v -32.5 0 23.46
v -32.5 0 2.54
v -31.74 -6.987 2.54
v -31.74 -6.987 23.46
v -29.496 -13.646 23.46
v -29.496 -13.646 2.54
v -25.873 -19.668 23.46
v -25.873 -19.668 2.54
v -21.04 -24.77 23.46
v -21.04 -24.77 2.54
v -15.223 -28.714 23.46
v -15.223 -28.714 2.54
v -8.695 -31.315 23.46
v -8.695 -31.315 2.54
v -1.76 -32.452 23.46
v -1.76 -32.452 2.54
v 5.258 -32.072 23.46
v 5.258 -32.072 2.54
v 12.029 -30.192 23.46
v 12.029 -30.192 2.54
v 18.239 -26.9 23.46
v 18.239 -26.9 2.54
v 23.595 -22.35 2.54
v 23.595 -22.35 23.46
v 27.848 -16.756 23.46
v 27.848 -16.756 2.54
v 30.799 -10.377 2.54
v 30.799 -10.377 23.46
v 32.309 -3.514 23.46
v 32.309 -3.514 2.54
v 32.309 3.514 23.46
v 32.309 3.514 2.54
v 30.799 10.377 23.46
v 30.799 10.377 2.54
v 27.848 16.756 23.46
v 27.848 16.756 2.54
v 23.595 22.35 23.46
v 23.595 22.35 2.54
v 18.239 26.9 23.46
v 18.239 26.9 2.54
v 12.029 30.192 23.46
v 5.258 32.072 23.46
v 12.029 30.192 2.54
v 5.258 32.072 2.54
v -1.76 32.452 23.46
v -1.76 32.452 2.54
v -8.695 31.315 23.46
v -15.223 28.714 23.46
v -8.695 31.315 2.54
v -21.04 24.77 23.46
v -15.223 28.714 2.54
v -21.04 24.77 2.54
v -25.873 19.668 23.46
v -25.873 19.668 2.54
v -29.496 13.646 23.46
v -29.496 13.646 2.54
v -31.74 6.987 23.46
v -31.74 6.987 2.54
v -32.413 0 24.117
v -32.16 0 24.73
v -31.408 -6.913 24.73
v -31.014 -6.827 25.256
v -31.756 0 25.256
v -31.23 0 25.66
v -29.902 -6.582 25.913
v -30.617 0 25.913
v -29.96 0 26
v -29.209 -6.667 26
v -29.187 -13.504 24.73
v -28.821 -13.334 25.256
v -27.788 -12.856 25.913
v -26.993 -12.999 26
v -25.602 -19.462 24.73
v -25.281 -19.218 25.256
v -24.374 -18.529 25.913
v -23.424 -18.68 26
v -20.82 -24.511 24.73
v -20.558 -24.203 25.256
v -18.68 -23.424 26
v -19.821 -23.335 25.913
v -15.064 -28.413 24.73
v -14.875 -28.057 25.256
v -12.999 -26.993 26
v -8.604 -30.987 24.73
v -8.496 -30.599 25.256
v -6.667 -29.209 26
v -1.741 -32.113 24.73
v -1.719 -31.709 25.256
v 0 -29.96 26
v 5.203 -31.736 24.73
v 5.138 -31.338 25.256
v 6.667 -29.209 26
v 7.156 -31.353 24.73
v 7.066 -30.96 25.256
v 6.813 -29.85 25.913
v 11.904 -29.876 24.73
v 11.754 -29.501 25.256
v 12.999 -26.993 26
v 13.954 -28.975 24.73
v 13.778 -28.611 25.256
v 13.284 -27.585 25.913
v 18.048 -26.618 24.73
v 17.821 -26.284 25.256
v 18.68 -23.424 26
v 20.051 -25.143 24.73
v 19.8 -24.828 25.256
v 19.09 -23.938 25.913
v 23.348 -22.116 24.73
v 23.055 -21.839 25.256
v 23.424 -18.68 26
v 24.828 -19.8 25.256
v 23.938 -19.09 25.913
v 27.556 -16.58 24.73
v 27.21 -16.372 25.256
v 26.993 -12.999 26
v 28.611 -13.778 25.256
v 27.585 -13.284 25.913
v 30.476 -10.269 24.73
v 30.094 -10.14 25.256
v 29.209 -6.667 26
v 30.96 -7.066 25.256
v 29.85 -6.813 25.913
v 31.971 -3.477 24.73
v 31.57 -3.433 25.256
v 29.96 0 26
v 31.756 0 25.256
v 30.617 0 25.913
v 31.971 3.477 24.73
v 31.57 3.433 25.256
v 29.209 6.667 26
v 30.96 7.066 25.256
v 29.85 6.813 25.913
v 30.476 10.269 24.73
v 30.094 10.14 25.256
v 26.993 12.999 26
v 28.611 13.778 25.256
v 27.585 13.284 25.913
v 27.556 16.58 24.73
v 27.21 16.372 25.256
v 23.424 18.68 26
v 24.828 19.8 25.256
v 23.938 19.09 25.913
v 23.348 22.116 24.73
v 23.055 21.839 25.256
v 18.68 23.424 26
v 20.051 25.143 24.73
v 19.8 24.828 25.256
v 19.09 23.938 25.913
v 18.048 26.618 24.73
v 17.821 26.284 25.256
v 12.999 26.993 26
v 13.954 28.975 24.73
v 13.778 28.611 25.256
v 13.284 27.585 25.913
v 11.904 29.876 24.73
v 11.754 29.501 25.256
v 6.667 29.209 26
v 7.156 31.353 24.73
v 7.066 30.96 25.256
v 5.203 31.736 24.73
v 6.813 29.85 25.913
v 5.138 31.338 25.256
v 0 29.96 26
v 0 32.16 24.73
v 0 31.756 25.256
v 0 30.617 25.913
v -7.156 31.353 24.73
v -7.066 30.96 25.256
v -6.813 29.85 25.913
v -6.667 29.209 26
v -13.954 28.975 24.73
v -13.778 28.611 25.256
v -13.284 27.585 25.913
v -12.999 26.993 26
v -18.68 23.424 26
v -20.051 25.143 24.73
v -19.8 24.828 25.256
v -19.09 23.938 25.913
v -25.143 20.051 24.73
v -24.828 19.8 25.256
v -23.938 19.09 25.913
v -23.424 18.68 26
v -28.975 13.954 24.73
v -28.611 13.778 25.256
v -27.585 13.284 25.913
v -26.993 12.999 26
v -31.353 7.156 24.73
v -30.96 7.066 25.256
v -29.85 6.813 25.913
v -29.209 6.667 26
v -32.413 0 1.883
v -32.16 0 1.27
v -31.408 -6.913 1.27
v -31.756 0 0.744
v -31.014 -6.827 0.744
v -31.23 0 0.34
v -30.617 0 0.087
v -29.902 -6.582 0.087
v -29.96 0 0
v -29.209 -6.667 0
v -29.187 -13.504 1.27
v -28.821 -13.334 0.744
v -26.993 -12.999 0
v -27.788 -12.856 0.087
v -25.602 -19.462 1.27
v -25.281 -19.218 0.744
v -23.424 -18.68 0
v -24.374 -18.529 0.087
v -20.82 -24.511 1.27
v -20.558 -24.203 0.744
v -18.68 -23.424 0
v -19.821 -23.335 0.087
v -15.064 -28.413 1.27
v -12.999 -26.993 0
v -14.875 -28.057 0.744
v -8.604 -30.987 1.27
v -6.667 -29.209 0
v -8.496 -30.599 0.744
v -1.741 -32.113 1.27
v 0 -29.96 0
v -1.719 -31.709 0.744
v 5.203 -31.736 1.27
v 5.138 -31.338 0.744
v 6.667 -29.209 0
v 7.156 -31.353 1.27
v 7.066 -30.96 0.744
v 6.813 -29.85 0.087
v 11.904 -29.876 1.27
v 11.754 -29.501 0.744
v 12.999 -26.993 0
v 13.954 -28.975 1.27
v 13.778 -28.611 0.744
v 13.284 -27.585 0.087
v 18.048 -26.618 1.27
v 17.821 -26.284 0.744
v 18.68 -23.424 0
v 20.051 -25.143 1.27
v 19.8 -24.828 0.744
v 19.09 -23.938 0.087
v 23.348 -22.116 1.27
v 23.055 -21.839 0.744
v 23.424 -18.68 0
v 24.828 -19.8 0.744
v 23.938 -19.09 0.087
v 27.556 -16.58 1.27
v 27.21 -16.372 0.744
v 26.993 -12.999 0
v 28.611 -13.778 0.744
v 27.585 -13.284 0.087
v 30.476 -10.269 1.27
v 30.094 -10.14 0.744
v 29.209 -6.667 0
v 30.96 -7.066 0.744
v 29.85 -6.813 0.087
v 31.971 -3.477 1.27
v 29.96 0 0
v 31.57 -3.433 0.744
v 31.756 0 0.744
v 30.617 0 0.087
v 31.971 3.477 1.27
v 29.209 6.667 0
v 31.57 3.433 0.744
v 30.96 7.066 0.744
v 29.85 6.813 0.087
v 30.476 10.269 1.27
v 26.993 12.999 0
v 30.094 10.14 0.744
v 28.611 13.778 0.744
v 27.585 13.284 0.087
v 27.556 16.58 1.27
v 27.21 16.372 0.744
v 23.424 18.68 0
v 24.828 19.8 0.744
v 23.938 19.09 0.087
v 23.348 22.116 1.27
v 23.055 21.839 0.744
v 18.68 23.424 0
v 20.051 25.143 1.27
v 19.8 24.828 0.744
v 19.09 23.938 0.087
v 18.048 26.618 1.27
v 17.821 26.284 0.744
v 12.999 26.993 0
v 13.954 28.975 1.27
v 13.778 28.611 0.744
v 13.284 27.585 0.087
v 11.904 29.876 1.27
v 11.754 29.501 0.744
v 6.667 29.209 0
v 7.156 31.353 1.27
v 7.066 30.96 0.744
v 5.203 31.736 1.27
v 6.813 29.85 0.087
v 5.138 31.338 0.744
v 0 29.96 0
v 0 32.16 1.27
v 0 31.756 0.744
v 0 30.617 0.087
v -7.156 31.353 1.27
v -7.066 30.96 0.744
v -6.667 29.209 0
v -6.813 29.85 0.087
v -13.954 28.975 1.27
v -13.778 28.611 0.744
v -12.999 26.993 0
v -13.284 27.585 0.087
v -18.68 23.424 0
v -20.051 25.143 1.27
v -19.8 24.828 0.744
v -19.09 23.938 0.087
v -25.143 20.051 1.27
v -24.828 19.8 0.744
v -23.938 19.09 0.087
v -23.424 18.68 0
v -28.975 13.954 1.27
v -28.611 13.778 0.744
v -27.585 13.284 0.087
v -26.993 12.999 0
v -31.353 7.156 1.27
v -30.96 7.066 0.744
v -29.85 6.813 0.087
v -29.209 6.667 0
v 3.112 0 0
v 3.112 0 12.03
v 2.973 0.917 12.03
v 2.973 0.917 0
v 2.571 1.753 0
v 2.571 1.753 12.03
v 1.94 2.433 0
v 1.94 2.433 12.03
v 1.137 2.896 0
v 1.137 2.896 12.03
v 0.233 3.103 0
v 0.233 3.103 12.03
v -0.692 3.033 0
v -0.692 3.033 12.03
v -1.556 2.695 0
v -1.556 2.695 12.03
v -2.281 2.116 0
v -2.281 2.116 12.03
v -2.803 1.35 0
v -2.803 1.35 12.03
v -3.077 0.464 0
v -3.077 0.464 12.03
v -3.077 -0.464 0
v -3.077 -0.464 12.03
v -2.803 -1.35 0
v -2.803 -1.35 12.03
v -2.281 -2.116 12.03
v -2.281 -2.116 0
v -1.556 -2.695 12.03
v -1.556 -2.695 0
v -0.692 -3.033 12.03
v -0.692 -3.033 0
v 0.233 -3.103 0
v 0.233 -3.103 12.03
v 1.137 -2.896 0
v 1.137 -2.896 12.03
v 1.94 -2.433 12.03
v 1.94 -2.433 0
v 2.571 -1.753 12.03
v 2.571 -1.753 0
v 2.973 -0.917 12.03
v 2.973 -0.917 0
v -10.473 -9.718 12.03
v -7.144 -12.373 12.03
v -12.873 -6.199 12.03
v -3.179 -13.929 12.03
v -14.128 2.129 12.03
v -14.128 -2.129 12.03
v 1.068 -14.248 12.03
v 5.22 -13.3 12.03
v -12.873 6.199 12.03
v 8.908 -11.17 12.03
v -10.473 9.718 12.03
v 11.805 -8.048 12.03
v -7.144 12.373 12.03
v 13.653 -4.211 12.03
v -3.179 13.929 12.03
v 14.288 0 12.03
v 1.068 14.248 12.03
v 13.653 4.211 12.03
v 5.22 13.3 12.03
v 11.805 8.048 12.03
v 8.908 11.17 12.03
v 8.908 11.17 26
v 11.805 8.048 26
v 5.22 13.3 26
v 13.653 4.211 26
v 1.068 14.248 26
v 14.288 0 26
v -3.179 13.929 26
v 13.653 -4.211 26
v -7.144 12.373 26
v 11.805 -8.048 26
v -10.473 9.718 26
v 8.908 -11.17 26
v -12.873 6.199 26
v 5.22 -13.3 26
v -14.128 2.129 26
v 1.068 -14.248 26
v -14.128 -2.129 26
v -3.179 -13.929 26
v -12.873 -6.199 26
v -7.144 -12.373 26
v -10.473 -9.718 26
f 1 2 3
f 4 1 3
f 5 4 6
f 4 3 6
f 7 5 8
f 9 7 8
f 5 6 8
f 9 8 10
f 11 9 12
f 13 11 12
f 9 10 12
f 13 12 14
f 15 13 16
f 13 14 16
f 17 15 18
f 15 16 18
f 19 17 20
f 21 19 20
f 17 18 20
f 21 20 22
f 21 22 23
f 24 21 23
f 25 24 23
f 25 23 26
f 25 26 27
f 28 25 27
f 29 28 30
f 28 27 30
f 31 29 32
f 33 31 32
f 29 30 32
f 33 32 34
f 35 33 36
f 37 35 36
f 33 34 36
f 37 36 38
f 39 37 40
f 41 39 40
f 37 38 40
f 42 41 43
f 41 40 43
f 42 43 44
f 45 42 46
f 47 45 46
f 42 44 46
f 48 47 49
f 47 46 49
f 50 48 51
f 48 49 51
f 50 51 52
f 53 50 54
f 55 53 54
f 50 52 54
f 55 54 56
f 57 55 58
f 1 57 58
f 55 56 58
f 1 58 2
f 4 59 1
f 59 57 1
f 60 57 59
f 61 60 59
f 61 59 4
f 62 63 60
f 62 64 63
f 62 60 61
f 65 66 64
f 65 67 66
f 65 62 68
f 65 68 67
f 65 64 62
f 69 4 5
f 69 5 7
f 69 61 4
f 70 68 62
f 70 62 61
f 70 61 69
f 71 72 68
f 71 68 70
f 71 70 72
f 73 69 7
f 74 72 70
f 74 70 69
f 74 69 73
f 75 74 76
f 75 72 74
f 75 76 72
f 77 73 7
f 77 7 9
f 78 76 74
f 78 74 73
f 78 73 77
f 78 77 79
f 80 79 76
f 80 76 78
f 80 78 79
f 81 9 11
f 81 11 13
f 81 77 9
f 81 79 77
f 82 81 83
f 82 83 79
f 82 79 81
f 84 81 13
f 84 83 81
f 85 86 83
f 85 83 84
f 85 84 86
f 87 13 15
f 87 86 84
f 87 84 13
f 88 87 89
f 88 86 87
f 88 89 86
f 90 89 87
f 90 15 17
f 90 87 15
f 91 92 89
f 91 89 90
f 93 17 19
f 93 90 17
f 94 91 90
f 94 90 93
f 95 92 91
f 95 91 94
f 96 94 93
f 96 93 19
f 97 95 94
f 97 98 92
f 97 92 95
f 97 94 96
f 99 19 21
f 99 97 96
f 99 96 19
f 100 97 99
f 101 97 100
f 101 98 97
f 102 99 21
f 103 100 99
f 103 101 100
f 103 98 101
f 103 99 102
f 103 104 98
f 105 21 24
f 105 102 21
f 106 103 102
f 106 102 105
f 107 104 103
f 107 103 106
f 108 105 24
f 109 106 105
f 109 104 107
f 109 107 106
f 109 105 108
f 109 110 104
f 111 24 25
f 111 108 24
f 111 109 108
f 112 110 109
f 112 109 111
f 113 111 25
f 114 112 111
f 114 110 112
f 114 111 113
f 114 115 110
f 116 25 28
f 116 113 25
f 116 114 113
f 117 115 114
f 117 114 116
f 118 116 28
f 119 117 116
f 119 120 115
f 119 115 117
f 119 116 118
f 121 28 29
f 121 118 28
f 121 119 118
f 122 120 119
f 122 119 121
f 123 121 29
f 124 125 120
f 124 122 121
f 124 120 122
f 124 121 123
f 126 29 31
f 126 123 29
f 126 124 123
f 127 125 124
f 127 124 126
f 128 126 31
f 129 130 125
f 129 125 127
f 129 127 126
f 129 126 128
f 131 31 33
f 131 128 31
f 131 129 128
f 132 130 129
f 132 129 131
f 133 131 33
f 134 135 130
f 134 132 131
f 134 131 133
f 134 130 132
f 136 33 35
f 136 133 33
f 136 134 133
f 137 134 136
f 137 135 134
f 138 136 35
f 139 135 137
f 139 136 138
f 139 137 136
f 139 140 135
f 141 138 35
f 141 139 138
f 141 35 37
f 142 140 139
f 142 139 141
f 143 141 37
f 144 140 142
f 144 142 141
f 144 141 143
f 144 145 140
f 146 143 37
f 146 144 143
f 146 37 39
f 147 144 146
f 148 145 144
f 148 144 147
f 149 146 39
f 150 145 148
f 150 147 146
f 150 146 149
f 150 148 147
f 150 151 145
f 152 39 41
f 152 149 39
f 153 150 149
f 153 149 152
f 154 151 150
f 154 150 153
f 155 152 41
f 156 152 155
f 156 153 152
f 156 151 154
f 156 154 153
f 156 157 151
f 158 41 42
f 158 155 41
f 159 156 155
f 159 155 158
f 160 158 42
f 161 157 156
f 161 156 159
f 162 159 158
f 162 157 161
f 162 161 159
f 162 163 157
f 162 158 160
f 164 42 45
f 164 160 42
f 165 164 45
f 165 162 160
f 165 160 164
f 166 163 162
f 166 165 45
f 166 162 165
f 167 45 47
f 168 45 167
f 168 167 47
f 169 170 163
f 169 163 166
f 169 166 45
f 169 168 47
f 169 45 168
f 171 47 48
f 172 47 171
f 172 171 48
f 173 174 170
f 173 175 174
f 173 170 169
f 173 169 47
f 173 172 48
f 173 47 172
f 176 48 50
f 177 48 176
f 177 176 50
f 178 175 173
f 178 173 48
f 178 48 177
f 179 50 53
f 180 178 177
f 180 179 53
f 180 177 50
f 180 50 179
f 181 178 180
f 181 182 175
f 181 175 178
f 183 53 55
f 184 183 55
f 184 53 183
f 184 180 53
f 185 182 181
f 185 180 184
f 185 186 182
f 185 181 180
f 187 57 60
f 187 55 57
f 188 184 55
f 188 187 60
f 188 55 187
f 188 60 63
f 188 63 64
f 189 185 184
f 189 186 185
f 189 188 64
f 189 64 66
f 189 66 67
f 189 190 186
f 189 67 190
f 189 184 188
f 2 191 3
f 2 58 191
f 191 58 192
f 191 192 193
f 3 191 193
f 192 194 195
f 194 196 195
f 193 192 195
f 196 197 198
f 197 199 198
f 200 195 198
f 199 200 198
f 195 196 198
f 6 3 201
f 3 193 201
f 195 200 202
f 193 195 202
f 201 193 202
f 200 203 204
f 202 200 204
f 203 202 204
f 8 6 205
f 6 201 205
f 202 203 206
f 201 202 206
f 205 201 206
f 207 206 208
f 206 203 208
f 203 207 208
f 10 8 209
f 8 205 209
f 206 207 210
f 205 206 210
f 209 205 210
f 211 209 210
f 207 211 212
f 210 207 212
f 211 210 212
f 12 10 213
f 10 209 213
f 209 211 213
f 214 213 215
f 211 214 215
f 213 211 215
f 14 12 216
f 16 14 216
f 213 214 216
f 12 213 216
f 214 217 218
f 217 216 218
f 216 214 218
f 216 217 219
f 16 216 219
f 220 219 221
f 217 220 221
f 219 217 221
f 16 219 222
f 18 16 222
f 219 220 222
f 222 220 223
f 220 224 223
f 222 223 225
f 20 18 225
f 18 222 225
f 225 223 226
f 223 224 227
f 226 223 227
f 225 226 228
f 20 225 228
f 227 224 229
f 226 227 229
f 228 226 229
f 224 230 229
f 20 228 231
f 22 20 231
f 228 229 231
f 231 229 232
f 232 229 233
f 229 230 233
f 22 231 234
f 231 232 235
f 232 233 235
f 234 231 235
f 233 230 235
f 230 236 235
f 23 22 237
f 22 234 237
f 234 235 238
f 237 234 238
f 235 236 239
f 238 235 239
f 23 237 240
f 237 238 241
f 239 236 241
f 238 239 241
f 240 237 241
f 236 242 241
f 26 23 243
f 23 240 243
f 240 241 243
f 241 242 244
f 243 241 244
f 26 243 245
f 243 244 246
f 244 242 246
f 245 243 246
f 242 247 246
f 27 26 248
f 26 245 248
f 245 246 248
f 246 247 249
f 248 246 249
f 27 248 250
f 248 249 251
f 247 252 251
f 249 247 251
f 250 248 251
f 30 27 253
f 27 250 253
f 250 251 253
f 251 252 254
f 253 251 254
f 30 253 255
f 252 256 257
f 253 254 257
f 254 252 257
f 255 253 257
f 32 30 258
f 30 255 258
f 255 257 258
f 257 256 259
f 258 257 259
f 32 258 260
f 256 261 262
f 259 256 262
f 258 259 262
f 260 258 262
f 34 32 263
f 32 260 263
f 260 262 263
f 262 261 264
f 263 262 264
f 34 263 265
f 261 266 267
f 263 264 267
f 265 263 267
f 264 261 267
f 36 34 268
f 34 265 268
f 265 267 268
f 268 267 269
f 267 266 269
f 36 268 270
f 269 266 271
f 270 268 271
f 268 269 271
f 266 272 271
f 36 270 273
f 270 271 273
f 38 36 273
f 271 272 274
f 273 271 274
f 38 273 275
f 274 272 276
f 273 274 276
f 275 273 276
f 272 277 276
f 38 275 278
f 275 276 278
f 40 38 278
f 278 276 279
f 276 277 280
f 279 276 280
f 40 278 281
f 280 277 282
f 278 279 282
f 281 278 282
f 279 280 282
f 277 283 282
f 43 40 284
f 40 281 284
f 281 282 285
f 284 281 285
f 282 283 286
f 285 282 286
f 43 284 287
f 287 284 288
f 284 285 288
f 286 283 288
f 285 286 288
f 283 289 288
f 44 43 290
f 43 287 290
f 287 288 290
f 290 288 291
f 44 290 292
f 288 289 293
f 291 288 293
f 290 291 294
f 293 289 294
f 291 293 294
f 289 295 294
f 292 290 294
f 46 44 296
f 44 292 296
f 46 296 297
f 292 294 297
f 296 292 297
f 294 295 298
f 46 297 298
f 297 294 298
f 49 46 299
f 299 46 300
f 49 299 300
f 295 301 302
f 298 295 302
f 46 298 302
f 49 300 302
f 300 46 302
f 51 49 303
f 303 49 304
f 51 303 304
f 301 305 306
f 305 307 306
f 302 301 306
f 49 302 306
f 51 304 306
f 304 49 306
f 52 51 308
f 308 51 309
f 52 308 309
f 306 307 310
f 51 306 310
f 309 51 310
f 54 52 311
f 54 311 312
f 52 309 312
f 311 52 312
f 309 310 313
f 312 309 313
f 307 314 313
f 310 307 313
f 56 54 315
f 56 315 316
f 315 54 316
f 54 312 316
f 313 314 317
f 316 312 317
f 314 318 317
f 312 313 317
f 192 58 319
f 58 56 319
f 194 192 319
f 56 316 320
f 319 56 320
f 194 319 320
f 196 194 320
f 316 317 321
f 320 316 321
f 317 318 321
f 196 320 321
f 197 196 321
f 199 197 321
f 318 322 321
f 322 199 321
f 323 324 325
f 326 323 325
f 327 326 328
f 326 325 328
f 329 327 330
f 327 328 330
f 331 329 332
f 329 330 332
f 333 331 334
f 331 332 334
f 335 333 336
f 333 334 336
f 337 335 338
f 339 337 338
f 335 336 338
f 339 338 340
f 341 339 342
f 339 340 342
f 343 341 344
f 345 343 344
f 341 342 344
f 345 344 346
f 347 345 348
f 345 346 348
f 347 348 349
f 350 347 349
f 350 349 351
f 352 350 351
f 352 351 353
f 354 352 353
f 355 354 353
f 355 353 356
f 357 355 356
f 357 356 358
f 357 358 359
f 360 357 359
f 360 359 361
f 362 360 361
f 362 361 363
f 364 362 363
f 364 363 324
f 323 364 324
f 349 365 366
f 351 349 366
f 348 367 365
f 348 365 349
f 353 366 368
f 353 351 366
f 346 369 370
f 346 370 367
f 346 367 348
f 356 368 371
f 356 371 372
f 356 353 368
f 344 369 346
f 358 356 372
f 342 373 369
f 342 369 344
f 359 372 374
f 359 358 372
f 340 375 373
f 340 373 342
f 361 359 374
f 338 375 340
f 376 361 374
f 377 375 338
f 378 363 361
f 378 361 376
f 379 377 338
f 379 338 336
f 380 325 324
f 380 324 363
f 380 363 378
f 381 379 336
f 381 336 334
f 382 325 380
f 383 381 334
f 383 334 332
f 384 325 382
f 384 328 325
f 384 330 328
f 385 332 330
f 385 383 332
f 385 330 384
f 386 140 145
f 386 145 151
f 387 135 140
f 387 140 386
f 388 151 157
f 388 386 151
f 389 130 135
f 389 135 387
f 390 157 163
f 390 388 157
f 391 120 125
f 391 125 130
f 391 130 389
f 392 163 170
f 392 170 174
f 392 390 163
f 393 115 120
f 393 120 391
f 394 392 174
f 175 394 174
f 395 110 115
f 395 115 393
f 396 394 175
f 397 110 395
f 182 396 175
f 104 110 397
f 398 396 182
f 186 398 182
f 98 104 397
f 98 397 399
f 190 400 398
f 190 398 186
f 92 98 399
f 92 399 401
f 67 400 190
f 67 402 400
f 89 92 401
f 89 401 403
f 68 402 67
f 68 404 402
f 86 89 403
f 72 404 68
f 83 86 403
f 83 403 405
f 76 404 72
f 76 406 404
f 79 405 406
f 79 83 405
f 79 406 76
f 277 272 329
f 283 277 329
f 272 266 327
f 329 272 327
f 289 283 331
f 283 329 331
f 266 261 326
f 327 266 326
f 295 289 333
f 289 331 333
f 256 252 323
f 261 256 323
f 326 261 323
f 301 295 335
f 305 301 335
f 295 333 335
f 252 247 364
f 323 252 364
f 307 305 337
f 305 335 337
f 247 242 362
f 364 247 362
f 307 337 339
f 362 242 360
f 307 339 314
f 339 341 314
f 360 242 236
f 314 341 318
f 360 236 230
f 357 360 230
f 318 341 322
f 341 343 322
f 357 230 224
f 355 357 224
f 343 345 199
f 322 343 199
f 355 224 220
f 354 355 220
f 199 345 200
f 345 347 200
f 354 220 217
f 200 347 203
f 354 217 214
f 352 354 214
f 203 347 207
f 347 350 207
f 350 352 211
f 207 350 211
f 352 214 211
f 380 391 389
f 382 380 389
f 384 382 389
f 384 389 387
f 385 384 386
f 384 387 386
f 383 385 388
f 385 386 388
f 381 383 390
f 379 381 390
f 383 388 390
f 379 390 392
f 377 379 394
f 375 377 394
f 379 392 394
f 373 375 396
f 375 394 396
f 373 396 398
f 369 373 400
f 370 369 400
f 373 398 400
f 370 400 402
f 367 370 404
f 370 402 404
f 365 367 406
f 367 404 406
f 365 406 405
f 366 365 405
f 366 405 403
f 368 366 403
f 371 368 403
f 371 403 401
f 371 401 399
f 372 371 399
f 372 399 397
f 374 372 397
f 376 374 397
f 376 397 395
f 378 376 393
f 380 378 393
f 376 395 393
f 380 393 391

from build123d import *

# Parameters (mm, degrees)
SKETCH1_R           = 32.5
BOSS_EXTRUDE1_DEPTH = 26
FILLET1_R           = 2.54
SKETCH2_R           = 3.1115
CUT_EXTRUDE1_DEPTH  = 26
SKETCH3_R           = 14.2875
CUT_EXTRUDE2_DEPTH  = 13.97


with BuildPart() as part:
    # Sketch1 → Boss-Extrude1 (new body)
    with BuildSketch(Plane.XY):
        with Locations(Location((0, 0, 0), (0, 0, 180))):
            Circle(SKETCH1_R)
    extrude(amount=BOSS_EXTRUDE1_DEPTH)

    # Fillet1
    fillet1_edges = [part.edges().sort_by_distance(p)[0] for p in [
        (32.5, 0, 0),
        (32.5, 0, 26),
    ]]
    fillet(fillet1_edges, radius=FILLET1_R)

    # Sketch2 → Cut-Extrude1 (cut)
    with BuildSketch(Plane.XY.offset(26)):
        Circle(SKETCH2_R)
    extrude(amount=-CUT_EXTRUDE1_DEPTH, mode=Mode.SUBTRACT)

    # Sketch3 → Cut-Extrude2 (cut)
    with BuildSketch(Plane.XY.offset(26)):
        Circle(SKETCH3_R)
    extrude(amount=-CUT_EXTRUDE2_DEPTH, mode=Mode.SUBTRACT)


solid = part.part
